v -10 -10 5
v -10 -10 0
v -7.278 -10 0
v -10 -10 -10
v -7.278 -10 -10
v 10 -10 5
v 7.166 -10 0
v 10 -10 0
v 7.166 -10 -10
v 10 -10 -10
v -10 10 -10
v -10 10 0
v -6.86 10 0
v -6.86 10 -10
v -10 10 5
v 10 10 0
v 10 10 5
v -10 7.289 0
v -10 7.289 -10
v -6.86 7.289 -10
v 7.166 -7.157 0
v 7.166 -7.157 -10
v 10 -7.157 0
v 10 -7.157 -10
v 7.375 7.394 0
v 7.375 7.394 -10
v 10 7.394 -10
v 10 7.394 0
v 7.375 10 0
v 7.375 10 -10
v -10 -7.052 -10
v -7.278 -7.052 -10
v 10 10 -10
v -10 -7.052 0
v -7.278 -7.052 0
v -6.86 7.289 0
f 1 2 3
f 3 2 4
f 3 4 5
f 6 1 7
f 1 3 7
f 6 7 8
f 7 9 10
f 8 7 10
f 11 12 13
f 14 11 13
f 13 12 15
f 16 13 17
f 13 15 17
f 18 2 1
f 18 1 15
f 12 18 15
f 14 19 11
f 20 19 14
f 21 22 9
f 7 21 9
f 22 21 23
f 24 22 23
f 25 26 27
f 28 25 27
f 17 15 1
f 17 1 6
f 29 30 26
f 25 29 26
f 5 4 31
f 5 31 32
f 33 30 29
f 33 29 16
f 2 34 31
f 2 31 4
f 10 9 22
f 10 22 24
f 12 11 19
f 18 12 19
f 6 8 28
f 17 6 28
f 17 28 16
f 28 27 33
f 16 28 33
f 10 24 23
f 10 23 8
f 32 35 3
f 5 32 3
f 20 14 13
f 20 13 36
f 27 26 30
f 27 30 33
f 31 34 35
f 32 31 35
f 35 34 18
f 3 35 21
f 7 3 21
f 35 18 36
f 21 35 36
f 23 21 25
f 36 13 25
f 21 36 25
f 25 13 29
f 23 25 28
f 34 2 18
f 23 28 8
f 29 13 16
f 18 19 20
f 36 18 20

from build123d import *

# Parameters (mm, degrees)
F0_W     = 20
F0_H     = 20
F1_DEPTH = 5
F2_W     = 2.721561
F2_H     = 2.947924
F2_W_2   = 2.833921
F2_H_2   = 2.843244
F2_W_3   = 2.62458
F2_H_3   = 2.606365
F2_W_4   = 3.140243
F2_H_4   = 2.711044
F3_DEPTH = 10


with BuildPart() as f1:
    # F0 (on Top) → F1 (new body)
    with BuildSketch(Plane.XY):
        Rectangle(F0_W, F0_H)
    extrude(amount=F1_DEPTH)

    # F2 (on face) → F3 (join)
    with BuildSketch(Plane(origin=(0, 0, 0), x_dir=(1, 0, 0), z_dir=(0, 0, -1))):
        with Locations((-8.639219, 8.526038)):
            Rectangle(F2_W, F2_H)
        with Locations((8.583039, 8.578378)):
            Rectangle(F2_W_2, F2_H_2)
        with Locations((8.68771, -8.696817)):
            Rectangle(F2_W_3, F2_H_3)
        with Locations((-8.429879, -8.644478)):
            Rectangle(F2_W_4, F2_H_4)
    extrude(amount=F3_DEPTH)


solid = f1.part
